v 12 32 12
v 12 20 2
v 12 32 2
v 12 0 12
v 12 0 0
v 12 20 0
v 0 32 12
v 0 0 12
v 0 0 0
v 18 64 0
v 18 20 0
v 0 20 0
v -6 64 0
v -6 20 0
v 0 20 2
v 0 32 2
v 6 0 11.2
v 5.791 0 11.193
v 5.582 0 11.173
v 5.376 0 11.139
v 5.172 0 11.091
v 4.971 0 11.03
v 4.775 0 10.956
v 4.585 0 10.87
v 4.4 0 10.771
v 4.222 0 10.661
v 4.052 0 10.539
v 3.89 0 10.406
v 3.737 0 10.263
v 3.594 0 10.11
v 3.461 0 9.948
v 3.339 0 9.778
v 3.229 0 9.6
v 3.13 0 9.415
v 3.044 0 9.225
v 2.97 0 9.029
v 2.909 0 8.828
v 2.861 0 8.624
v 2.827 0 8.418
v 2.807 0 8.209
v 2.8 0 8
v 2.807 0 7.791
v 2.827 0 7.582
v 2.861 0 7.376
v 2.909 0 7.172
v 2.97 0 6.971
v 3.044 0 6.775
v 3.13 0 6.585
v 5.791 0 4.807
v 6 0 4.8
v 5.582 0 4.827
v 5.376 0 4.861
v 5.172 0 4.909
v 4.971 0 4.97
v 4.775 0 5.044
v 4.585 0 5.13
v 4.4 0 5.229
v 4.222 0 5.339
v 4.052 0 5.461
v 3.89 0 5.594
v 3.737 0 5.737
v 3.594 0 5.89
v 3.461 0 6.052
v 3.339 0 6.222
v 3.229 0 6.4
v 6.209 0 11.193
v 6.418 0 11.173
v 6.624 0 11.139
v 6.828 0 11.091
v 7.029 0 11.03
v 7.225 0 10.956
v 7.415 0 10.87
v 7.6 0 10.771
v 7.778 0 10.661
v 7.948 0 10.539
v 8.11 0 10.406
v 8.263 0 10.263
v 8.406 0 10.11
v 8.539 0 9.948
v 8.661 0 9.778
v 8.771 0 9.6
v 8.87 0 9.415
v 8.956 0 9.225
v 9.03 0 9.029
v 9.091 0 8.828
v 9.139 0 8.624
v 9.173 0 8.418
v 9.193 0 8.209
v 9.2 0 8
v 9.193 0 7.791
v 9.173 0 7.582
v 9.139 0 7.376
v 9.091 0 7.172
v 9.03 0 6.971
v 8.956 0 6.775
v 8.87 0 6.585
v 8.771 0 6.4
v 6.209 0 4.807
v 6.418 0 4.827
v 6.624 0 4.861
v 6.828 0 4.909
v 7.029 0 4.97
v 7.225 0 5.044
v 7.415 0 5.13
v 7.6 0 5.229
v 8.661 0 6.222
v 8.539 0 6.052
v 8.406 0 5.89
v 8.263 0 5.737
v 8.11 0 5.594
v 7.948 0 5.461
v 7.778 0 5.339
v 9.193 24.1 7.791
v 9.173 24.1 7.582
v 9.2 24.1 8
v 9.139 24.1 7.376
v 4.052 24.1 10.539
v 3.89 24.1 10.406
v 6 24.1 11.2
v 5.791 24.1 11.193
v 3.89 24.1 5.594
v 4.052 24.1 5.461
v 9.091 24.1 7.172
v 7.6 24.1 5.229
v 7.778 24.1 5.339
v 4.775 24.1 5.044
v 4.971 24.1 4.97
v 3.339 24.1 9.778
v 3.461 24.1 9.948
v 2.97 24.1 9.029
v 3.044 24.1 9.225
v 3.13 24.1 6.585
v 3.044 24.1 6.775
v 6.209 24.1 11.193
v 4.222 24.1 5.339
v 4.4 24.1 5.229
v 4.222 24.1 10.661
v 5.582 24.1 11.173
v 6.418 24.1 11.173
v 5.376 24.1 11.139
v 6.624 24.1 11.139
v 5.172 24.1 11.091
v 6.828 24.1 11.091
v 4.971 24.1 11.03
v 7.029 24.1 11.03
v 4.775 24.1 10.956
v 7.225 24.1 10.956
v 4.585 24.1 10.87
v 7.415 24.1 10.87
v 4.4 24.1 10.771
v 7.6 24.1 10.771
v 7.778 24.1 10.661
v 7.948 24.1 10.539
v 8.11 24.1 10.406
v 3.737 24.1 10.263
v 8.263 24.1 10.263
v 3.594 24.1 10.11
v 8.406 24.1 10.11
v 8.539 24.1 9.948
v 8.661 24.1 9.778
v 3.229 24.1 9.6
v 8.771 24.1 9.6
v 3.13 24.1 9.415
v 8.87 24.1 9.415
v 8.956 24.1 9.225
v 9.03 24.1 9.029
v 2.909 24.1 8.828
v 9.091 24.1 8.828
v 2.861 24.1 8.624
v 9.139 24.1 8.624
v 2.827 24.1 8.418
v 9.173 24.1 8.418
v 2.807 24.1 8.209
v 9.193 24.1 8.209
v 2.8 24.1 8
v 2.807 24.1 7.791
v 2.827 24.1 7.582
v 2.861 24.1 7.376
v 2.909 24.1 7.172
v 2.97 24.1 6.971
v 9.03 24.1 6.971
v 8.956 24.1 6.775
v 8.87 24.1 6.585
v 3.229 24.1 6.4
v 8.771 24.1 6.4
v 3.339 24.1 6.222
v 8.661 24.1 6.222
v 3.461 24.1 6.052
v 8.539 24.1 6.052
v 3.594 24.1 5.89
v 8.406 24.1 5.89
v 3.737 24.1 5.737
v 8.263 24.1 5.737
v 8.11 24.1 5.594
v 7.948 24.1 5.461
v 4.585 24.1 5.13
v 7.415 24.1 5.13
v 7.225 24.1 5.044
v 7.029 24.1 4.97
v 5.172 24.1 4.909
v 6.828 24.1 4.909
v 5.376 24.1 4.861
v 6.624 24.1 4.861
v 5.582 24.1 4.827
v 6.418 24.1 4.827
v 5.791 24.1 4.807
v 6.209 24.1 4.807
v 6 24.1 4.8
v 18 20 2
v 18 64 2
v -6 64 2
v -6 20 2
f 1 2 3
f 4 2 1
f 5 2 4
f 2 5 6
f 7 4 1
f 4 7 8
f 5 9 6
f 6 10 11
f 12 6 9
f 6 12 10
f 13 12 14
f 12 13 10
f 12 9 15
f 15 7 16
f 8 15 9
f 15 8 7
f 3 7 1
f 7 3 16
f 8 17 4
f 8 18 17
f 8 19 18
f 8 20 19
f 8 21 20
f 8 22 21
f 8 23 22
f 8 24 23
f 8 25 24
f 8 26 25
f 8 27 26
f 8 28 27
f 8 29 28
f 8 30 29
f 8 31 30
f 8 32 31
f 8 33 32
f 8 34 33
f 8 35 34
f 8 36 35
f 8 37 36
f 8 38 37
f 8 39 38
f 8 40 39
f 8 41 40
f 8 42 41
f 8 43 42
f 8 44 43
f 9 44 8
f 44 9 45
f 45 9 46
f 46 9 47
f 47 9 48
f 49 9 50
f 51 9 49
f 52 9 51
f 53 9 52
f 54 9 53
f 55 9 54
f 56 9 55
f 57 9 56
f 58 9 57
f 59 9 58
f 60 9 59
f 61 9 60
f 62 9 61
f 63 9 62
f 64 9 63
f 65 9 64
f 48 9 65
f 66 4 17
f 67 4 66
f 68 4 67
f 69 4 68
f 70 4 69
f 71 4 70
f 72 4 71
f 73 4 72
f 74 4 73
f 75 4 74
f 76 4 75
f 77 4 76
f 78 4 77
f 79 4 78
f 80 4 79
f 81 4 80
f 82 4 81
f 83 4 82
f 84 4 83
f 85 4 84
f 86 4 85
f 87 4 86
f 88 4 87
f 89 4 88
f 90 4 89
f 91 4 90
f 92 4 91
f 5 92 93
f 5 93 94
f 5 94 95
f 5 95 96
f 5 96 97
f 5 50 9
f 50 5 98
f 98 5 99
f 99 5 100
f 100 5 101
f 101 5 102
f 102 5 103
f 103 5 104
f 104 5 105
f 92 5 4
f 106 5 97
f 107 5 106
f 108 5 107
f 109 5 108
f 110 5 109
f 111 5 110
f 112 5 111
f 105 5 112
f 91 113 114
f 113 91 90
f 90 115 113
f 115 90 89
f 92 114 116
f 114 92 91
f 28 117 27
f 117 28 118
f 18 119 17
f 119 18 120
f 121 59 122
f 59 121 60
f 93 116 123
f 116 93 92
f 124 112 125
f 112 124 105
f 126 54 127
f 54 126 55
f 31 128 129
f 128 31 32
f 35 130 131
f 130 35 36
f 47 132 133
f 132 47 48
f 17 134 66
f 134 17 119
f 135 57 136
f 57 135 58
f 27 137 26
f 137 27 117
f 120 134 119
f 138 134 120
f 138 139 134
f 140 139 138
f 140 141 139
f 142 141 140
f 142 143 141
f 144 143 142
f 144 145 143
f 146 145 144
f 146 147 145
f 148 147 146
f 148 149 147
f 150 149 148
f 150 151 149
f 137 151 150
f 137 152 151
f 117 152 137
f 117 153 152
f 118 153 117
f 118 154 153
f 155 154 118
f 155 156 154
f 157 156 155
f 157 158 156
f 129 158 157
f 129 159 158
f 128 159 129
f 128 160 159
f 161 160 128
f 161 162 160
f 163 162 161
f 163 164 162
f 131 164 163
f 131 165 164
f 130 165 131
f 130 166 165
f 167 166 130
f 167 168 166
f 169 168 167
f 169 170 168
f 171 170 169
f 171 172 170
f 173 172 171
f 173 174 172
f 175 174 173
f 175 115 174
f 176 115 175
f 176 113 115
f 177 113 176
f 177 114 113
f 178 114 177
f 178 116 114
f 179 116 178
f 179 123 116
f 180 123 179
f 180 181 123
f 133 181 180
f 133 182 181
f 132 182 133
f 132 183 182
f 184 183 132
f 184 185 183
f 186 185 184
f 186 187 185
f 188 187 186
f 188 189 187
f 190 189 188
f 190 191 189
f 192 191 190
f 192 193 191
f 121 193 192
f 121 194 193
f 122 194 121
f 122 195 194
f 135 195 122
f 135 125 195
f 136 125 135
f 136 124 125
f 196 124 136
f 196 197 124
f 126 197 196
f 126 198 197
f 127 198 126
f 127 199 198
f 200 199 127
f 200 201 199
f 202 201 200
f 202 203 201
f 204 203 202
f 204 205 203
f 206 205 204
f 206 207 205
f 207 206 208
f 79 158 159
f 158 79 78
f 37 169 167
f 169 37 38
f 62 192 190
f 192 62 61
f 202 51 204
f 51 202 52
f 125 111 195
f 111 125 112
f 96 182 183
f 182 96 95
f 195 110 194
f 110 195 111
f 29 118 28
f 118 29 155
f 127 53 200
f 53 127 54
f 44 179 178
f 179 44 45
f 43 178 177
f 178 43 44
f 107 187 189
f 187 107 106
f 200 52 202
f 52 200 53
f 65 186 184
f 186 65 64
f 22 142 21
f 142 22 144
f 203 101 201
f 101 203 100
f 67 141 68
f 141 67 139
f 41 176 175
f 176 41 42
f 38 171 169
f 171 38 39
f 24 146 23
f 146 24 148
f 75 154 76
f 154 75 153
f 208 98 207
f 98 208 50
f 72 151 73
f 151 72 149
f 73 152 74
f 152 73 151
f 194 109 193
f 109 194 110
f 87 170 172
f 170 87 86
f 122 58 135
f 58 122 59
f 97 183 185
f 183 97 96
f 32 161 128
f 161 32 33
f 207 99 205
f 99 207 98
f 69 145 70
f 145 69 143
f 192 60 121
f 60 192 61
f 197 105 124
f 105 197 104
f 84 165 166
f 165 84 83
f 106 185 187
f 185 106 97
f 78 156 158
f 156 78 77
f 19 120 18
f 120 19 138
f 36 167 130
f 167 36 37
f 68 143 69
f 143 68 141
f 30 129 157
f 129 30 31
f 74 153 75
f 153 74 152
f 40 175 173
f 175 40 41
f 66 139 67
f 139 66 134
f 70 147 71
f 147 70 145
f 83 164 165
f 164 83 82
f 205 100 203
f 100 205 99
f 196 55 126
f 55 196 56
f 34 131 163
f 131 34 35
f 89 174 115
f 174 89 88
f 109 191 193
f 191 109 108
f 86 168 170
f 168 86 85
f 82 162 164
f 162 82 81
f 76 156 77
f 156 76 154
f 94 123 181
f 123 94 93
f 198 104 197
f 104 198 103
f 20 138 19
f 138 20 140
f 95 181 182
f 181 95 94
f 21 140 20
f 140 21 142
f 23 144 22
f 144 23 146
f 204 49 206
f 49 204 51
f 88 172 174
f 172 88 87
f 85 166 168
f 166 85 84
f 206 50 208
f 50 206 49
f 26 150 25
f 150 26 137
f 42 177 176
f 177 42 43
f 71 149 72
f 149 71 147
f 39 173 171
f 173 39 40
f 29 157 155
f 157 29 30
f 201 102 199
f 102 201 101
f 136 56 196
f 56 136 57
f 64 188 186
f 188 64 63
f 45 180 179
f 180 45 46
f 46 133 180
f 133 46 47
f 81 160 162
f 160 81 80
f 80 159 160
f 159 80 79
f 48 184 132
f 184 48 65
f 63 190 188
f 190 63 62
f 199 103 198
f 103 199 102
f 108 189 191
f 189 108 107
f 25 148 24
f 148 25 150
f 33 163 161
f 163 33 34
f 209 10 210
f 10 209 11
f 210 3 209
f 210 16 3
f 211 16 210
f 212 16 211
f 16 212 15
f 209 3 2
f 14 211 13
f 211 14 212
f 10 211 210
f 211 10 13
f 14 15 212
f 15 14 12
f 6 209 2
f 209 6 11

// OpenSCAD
// F-14 v109 representative hardpoint material coupon
// Local front-socket geometry: 12x12 mm socket, 6.4 mm bore over 24 mm,
// 8 mm solid tail, bonded/monolithic into a 2 mm fork-style base tab.
$fn=96;
socket_w=12;
socket_h=12;
socket_len=24;
tail_len=8;
bore_d=6.4;
bore_z=8;           // v99 front socket bore center from bottom
fork_t=2;
fork_w=24;
fork_len=44;

module socket_body(){
    difference(){
        cube([socket_w,socket_len+tail_len,socket_h]);
        // Bore only through the original 24 mm socket zone; tail remains solid.
        translate([socket_w/2,-0.1,bore_z])
            rotate([-90,0,0]) cylinder(h=socket_len+0.2,d=bore_d);
    }
}

module fork_tab(){
    translate([-(fork_w-socket_w)/2,20,0]) cube([fork_w,fork_len,fork_t]);
}

union(){
    socket_body();
    fork_tab();
}
